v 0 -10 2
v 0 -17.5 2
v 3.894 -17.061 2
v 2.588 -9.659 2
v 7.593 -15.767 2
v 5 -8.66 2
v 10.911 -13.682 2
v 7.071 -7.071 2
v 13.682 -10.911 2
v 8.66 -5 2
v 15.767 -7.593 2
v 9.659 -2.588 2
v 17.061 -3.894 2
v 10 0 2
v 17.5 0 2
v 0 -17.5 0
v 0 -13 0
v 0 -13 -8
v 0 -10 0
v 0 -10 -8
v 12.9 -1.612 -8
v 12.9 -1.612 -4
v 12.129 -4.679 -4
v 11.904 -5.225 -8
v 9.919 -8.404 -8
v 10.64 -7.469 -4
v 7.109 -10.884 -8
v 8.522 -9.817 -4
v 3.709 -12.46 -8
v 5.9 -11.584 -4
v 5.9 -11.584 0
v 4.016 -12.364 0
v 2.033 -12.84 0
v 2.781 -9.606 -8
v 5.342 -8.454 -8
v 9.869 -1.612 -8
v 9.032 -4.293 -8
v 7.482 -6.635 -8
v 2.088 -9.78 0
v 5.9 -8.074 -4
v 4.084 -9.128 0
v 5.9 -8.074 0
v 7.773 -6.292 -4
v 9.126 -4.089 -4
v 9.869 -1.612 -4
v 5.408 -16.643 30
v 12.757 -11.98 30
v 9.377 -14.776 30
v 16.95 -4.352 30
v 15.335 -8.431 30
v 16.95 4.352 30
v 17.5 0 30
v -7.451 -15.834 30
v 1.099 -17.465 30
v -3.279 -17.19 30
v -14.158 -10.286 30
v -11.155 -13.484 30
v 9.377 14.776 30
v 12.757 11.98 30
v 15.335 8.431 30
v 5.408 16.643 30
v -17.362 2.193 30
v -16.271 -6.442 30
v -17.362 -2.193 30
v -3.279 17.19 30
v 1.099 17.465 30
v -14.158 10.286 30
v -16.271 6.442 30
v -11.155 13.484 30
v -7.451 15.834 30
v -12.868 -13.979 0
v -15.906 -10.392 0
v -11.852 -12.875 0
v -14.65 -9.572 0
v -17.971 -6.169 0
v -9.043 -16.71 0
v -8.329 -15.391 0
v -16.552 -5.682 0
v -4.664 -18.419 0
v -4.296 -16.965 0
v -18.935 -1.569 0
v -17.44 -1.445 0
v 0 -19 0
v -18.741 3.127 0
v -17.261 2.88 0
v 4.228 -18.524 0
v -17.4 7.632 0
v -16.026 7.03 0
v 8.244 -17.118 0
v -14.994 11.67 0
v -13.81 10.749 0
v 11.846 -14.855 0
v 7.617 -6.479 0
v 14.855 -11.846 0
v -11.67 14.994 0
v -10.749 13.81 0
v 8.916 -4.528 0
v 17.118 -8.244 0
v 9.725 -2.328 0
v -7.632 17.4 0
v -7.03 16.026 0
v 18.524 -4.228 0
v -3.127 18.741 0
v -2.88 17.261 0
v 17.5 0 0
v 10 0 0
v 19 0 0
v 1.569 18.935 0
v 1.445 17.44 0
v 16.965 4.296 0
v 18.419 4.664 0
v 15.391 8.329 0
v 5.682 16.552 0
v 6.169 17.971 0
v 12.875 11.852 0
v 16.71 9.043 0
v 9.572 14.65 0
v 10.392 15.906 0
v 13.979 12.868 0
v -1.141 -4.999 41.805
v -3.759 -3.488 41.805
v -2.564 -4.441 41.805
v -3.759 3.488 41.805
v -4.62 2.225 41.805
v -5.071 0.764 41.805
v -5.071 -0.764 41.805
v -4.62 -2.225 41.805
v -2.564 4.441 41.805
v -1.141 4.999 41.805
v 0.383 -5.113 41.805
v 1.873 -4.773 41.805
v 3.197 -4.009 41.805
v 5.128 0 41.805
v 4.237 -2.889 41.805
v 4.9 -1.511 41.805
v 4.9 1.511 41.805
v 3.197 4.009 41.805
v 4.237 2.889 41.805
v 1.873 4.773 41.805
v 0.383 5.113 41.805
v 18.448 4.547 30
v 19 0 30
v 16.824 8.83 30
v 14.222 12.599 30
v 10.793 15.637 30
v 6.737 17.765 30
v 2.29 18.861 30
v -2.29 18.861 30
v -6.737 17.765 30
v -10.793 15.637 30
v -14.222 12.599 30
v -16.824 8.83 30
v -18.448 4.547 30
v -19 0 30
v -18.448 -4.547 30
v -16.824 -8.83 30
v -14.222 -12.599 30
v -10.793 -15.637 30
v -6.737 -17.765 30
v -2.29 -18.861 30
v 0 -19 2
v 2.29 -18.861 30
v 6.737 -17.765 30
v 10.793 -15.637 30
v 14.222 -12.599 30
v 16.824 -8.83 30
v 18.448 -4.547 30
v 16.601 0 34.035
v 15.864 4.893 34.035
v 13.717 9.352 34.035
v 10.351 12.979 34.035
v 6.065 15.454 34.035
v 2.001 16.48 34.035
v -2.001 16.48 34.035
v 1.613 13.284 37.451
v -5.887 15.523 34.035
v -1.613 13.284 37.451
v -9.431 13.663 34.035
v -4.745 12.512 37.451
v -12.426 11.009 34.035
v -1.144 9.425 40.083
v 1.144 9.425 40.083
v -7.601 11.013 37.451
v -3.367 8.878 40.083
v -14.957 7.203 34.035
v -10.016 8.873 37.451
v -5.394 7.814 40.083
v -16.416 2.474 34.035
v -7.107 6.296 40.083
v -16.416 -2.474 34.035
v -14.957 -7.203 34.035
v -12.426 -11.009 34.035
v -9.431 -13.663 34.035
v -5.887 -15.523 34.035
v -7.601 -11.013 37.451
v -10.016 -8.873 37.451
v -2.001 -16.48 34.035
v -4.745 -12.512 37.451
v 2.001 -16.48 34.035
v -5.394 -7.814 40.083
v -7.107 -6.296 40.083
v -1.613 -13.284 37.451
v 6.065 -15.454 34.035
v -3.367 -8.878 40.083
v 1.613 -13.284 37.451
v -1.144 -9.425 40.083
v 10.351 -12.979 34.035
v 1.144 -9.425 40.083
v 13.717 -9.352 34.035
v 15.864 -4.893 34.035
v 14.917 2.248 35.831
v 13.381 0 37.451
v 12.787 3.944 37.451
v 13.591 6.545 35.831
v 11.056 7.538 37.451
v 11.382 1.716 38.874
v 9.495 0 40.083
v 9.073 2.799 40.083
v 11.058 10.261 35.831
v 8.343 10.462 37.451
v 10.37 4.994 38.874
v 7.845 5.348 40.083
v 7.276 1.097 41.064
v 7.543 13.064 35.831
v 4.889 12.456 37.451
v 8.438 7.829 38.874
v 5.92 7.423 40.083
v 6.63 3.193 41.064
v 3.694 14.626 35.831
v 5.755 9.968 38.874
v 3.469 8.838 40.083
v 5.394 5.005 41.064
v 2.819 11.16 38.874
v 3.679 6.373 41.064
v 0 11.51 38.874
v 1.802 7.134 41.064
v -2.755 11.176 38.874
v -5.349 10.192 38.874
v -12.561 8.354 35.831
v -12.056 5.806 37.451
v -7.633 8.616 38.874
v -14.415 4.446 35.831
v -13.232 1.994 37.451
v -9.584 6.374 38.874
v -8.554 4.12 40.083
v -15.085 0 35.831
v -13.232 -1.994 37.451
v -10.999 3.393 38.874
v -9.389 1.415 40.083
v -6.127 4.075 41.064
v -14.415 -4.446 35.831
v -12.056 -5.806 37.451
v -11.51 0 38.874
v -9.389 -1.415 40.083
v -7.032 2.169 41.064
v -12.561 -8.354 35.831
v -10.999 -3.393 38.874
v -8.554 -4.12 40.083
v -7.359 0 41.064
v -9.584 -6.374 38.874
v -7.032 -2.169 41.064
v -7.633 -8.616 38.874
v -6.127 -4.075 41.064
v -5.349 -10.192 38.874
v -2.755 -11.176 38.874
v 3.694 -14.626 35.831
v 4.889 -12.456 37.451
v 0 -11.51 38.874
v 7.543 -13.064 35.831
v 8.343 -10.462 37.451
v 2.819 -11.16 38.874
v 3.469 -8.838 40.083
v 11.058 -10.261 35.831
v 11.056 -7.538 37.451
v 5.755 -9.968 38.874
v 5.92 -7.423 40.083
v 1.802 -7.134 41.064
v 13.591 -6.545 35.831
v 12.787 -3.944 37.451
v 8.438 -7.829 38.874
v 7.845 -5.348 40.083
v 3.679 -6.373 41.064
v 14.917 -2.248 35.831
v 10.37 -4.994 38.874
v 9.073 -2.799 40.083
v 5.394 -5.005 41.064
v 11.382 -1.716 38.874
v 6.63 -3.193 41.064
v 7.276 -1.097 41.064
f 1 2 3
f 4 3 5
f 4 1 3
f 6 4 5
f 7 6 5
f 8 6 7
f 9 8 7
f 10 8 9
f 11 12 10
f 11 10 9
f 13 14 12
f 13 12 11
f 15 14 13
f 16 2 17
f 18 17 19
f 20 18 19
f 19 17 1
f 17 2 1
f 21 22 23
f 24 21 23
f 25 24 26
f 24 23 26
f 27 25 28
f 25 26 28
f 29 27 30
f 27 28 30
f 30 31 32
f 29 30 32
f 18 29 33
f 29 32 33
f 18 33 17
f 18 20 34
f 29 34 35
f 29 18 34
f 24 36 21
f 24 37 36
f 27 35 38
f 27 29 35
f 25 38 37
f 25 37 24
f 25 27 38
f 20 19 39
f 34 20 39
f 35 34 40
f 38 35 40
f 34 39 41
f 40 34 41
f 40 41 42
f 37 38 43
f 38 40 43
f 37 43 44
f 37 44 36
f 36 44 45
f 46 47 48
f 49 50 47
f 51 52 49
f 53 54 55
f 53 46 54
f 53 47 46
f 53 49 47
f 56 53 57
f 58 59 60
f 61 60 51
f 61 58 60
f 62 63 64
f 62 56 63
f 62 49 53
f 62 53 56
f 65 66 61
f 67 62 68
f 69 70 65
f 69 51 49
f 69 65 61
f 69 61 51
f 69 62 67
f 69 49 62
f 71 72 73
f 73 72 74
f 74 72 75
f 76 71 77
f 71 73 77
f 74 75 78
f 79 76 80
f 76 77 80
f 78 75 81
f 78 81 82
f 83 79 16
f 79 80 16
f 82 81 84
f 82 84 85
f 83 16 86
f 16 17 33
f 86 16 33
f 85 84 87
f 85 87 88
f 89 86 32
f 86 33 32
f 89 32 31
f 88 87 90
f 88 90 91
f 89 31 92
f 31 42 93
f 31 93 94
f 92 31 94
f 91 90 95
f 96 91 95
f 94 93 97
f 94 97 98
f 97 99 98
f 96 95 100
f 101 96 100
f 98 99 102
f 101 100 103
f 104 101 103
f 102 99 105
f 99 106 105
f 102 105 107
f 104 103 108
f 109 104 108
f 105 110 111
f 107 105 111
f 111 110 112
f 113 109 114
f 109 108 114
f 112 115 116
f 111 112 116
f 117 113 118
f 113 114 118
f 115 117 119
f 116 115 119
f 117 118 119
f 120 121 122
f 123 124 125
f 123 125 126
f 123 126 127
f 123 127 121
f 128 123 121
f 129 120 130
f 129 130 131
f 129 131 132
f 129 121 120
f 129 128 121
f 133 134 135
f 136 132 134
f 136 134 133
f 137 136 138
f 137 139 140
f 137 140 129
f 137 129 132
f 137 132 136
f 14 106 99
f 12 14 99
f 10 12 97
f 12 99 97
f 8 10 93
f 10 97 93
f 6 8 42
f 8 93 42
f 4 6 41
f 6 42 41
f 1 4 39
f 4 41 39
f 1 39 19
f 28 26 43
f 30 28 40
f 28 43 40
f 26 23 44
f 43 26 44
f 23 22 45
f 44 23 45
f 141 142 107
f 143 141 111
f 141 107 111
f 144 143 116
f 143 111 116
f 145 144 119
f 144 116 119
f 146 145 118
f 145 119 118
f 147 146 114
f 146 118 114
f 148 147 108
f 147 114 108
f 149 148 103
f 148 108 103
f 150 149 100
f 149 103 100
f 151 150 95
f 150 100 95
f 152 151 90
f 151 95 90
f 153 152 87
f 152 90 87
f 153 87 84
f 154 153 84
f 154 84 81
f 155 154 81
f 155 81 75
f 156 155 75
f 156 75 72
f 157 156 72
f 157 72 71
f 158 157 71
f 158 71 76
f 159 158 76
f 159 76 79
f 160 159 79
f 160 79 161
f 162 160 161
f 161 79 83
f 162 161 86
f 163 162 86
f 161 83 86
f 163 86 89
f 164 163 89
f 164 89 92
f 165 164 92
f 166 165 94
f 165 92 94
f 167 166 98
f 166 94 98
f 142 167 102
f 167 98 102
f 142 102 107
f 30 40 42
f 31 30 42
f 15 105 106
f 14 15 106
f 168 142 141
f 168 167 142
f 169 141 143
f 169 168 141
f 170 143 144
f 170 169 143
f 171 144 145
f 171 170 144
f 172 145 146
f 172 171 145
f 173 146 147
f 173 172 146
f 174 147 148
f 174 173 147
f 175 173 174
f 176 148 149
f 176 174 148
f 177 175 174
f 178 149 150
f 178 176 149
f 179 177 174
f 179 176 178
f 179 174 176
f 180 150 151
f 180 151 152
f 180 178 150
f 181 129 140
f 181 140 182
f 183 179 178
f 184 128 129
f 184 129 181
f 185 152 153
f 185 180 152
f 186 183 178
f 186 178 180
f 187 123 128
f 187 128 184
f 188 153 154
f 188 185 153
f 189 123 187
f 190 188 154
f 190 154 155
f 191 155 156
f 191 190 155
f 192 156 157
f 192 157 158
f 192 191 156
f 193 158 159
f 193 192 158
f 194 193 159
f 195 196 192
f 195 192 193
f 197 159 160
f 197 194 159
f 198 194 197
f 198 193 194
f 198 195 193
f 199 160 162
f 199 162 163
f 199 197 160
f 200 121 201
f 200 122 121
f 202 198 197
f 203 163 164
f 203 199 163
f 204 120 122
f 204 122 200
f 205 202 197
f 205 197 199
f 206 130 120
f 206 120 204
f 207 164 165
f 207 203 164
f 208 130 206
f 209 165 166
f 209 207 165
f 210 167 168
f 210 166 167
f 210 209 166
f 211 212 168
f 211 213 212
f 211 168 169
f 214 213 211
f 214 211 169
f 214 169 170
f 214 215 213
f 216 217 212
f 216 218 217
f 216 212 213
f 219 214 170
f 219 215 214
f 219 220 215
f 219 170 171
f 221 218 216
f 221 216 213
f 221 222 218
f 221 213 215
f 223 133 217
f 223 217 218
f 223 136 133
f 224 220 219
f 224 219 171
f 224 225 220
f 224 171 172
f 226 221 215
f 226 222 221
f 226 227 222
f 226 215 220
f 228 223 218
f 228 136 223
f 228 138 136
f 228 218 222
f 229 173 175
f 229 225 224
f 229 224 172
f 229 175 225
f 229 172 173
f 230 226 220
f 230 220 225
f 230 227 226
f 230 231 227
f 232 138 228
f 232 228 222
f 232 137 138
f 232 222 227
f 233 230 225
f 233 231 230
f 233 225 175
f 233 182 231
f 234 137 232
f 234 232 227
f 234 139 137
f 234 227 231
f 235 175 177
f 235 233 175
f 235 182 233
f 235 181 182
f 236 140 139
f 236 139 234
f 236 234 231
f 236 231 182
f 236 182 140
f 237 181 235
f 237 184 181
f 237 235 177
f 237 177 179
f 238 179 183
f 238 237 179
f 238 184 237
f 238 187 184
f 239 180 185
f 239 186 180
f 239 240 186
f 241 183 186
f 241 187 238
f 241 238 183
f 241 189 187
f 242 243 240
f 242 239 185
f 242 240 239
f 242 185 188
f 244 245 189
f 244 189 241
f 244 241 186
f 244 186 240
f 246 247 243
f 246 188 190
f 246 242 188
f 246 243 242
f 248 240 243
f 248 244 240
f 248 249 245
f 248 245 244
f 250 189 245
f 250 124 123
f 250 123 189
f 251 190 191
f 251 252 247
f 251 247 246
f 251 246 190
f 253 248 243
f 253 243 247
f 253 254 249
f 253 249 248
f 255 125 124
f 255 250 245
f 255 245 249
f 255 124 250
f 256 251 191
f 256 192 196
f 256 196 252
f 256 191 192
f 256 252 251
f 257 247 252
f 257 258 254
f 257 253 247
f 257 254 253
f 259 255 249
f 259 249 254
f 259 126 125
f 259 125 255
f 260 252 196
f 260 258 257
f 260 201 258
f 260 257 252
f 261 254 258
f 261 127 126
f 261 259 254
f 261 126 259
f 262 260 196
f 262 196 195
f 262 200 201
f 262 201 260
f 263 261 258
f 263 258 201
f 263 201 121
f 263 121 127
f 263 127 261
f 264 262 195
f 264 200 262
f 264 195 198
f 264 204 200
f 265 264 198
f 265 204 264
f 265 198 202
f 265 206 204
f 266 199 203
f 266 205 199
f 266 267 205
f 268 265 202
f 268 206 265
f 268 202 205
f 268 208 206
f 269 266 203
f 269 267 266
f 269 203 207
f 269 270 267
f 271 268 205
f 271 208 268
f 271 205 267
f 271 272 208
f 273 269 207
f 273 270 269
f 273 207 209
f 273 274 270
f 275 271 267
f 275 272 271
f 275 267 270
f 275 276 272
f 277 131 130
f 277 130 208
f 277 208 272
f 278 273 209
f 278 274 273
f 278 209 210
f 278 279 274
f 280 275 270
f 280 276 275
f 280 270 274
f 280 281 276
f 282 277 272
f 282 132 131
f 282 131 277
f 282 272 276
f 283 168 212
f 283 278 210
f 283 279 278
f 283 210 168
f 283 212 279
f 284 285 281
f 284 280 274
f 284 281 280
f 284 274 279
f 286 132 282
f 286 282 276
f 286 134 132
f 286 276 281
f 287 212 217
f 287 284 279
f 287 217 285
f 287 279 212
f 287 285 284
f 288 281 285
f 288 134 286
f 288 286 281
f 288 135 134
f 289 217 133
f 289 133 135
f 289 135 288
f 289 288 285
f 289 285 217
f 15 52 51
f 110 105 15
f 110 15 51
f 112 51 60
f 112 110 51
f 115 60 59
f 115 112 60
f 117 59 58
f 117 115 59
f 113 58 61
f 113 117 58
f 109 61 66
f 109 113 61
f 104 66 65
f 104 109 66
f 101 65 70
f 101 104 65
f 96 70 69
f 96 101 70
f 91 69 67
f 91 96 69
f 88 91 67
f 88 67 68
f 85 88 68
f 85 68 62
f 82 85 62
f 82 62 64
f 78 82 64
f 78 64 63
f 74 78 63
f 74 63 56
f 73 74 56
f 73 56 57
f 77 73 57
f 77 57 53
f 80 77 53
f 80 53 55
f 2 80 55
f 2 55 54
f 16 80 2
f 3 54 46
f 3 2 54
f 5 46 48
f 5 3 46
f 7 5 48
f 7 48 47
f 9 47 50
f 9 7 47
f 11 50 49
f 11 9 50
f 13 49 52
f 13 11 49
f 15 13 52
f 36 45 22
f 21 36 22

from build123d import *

# Parameters (mm, degrees)
F0_R     = 19
F0_R_2   = 17.5
F1_DEPTH = 30
F5_DEPTH = 2
F7_DEPTH = 8
F8_W     = 3.0304512245
F8_H     = 4
F8_W_2   = 3.9695487755
F9_DEPTH = 25


# Not quite as in the source:
# - a feature names something its author has since deleted; it is built from what else it names


with BuildPart() as f1:
    # F0 (on Top) → F1 (new body)
    with BuildSketch(Plane.XY):
        Circle(F0_R)
        Circle(F0_R_2, mode=Mode.SUBTRACT)
    extrude(amount=F1_DEPTH)

    # F2 (on Front) → F3 (revolve)
    with BuildSketch(Plane.XZ):
        with BuildLine():
            Line((0, 41.805047949), (0, 30))
            Line((0, 30), (19, 30))
            ThreePointArc((19, 30), (13.3813344534, 37.450646936), (5.1278058683, 41.805047949))
            Line((5.1278058683, 41.805047949), (0, 41.805047949))
        make_face()
    revolve(axis=Axis((0, 0, 35.9025239745), (0, 0, 1)))

    # F4 (on Top) → F5 (join)
    with BuildSketch(Plane.XY):
        with BuildLine():
            ThreePointArc((10, 0), (7.0710678119, -7.0710678119), (0, -10))
            Line((0, -10), (0, -19))
            ThreePointArc((0, -19), (13.4173031296, -13.4253390842), (18.972583327, 0))
            Line((18.972583327, 0), (10, 0))
        make_face()
    extrude(amount=F5_DEPTH)

    # F6 (on face) → F7 (join)
    with BuildSketch(Plane(origin=(0, 0, 0), x_dir=(1, 0, 0), z_dir=(0, 0, -1))):
        with BuildLine():
            Line((9.8692176419, 1.6119997323), (12.8996688664, 1.6119997323))
            ThreePointArc((12.8996688664, 1.6119997323), (8.6036039972, 9.745665614), (0, 13))
            Line((0, 13), (0, 10))
            ThreePointArc((0, 10), (6.4761100468, 7.6197111928), (9.8692176419, 1.6119997323))
        make_face()
    extrude(amount=F7_DEPTH)

    # F8 (on face) → F9 (cut)
    with BuildSketch(Plane(origin=(0, -1.6119997323, 0), x_dir=(-1, 0, 0), z_dir=(0, 1, 0))):
        with Locations((-11.3844432541, -2)):
            Rectangle(F8_W, F8_H)
        with Locations((-7.8844432541, -2)):
            Rectangle(F8_W_2, F8_H)
    extrude(amount=-F9_DEPTH, mode=Mode.SUBTRACT)


solid = f1.part
